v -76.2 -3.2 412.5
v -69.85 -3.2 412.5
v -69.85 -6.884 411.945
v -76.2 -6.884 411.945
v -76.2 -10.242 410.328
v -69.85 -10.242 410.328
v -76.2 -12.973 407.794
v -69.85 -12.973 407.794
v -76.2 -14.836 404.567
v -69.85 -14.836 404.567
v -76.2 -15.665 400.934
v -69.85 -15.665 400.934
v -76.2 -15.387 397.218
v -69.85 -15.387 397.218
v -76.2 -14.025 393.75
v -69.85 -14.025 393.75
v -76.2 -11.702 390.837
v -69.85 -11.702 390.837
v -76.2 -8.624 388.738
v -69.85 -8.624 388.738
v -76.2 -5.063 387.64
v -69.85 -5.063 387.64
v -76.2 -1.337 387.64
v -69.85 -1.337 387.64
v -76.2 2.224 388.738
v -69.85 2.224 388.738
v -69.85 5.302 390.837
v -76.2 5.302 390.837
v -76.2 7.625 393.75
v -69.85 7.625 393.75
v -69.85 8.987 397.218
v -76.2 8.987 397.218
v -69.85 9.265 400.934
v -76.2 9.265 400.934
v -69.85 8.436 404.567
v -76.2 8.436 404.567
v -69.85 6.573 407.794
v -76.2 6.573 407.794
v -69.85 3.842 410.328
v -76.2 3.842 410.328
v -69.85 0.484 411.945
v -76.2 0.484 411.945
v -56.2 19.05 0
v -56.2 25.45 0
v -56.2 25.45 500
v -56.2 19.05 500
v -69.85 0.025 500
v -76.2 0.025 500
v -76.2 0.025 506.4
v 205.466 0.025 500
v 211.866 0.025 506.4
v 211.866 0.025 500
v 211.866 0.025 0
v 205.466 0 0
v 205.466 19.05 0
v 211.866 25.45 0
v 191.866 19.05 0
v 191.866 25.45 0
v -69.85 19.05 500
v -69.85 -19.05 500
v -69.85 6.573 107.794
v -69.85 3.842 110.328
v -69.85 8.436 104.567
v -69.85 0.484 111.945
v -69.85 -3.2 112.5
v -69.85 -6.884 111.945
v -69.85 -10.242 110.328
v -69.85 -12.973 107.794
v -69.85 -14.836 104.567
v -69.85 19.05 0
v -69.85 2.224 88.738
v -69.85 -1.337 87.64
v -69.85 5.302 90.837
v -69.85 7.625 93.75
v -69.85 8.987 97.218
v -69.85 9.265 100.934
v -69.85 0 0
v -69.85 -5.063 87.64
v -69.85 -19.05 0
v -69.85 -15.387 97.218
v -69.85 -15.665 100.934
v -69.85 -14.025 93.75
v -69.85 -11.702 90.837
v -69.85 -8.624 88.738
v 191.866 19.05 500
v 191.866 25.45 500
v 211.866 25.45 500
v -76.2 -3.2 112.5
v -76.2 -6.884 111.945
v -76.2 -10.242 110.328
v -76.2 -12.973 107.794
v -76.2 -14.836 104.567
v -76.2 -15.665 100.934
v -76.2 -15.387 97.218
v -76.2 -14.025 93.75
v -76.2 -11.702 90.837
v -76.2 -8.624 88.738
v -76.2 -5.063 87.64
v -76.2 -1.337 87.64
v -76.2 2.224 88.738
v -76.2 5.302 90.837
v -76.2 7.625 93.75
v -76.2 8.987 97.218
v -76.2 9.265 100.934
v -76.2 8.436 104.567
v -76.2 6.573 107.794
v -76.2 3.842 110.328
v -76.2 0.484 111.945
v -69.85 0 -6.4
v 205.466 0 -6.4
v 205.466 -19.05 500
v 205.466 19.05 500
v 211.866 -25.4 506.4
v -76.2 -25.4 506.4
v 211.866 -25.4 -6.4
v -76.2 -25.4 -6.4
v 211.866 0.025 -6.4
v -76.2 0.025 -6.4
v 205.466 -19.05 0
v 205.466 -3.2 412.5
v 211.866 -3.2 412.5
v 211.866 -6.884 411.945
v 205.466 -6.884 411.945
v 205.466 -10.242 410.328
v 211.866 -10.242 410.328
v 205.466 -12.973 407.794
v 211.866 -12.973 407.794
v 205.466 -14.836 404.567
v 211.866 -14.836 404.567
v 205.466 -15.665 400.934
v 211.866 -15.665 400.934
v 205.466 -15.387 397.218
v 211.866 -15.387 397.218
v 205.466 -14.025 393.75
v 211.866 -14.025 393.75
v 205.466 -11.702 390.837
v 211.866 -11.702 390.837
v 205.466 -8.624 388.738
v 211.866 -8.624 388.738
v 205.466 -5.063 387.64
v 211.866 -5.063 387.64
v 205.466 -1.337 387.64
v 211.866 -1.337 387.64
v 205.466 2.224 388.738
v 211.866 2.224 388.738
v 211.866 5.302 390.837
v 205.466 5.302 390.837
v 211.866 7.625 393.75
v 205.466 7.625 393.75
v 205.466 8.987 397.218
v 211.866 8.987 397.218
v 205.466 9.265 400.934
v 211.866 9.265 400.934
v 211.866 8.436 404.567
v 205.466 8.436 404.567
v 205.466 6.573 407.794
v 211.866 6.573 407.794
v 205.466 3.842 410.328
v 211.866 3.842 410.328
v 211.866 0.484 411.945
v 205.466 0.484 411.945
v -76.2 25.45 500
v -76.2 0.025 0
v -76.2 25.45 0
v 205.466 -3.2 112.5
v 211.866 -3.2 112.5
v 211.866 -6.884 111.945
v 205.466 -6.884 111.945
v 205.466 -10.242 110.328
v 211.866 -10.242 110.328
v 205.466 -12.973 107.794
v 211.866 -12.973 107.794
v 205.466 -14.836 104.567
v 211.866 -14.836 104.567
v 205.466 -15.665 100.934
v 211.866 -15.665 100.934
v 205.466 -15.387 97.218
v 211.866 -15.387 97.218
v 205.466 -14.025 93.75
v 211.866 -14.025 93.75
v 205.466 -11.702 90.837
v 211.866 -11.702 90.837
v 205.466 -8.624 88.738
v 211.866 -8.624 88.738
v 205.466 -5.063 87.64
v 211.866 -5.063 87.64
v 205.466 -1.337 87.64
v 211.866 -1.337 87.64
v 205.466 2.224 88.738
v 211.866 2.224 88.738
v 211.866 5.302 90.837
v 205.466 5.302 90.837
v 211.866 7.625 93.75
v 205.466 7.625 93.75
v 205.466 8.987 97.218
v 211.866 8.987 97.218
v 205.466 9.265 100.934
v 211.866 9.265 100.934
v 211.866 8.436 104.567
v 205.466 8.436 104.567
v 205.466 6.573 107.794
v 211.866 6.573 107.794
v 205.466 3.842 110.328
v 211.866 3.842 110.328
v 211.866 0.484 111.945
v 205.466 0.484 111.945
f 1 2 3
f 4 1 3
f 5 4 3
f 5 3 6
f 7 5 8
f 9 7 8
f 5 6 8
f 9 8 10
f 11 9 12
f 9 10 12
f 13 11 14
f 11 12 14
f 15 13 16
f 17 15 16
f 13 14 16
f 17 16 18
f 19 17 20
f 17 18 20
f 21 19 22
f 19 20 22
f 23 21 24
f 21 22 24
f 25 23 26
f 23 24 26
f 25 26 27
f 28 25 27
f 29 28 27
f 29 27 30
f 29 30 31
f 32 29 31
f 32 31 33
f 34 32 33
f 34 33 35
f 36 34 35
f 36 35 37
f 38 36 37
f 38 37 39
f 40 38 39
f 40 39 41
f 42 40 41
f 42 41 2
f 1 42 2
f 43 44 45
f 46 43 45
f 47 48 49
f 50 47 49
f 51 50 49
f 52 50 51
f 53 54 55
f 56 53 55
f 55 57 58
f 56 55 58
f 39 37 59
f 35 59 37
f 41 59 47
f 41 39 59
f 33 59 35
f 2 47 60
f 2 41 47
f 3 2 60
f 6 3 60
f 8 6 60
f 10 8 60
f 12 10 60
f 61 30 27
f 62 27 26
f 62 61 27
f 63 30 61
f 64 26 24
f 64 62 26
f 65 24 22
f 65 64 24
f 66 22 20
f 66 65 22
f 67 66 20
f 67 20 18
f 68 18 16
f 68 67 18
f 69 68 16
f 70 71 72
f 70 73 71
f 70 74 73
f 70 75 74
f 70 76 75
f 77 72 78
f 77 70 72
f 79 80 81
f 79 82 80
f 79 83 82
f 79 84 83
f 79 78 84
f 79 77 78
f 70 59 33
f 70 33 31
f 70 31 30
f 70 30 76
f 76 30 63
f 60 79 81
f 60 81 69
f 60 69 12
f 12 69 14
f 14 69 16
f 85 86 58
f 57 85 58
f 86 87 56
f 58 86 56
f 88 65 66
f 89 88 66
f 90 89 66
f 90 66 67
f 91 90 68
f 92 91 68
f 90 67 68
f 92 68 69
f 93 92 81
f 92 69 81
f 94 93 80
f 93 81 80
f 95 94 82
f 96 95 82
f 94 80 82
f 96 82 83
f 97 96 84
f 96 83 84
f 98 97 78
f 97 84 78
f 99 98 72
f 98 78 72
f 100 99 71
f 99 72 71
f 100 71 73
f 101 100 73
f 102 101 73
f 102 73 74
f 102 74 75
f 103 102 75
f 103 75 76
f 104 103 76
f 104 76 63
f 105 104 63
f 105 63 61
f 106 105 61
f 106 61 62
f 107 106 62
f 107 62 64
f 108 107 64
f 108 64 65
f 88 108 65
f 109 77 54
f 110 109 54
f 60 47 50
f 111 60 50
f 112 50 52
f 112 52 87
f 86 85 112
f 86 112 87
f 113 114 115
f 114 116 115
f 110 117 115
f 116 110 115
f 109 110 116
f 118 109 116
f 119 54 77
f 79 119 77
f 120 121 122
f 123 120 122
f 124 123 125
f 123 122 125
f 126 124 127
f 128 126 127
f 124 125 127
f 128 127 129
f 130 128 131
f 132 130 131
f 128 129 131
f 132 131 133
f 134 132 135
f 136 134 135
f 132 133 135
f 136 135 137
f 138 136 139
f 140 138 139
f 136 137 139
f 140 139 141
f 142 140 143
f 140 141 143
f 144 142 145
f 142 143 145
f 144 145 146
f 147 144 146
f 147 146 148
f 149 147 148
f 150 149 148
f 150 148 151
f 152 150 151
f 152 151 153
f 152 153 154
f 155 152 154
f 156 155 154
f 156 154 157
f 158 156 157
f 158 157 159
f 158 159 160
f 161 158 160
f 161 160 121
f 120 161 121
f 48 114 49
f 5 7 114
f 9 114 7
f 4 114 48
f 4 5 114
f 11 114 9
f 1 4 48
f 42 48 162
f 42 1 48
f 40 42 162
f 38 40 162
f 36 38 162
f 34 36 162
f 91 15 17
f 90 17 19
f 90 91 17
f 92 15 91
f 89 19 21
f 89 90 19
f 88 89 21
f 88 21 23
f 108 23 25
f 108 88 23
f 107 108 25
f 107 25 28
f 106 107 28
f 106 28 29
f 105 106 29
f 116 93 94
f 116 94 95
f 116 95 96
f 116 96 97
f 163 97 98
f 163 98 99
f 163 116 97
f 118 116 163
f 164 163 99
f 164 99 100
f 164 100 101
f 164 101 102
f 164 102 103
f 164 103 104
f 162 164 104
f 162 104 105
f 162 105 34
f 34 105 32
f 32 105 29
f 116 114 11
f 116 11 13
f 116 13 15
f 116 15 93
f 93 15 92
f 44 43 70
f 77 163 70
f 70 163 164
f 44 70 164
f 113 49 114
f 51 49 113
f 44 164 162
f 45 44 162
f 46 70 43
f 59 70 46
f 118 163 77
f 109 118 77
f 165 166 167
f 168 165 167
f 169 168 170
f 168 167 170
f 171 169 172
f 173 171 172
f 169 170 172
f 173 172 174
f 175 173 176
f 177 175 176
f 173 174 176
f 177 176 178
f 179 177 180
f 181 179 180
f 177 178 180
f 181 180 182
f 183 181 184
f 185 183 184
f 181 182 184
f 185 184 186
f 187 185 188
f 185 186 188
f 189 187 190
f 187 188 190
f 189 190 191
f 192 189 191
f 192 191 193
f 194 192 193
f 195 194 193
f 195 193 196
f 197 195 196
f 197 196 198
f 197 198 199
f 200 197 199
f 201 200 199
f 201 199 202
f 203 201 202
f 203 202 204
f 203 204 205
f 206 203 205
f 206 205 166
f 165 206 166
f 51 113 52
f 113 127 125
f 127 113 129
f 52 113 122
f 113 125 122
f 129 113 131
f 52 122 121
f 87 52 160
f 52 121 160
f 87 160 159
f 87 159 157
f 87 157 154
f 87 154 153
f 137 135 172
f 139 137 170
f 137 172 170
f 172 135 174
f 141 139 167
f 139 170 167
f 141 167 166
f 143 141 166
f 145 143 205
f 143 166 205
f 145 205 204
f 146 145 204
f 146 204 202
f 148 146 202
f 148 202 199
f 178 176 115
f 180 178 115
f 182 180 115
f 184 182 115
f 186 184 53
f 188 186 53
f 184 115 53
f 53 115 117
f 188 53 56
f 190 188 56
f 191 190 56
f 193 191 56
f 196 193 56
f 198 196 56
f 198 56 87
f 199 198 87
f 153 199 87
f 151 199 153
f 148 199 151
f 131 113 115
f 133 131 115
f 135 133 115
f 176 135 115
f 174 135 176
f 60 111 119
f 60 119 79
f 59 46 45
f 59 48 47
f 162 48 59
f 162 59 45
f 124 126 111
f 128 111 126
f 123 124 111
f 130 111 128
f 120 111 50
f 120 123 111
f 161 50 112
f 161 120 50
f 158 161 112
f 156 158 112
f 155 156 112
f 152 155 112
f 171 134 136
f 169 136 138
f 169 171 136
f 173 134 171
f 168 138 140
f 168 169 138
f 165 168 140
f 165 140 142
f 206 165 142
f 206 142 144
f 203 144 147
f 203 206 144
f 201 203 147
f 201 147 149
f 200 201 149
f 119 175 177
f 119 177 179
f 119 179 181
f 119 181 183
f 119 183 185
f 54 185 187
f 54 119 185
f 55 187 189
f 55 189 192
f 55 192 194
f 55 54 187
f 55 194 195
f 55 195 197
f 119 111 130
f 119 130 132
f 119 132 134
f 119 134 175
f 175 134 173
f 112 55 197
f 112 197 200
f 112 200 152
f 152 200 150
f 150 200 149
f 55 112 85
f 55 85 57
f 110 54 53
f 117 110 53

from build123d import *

# Parameters (mm, degrees)
BOSS_EXTRUDE1_DEPTH = 500
SKETCH2_R           = 12.5
CUT_EXTRUDE1_DEPTH  = 485.648
SKETCH3_W           = 500
SKETCH3_H           = 6.4
BOSS_EXTRUDE3_DEPTH = 20
SKETCH4_W           = 500
SKETCH4_H           = 6.4
BOSS_EXTRUDE4_DEPTH = 20
BOSS_EXTRUDE5_DEPTH = 6.4
SKETCH6_W           = 288.065528703
SKETCH6_H           = 25.425
BOSS_EXTRUDE6_DEPTH = 6.4


with BuildPart() as part:
    # Sketch1 → Boss-Extrude1 (new body)
    with BuildSketch(Plane.XY):
        Polygon((-69.85, 19.05), (-69.85, -19.049737181), (69.85, -19.049737181), (205.465528703, -19.049737181), (205.465528703, 19.05), (211.865528703, 19.05), (211.865528703, -25.4), (76.2, -25.4), (-76.2, -25.4), (-76.2, 19.05), align=None)
    extrude(amount=BOSS_EXTRUDE1_DEPTH)

    # Sketch2 → Cut-Extrude1 (cut)
    with BuildSketch(Plane(origin=(211.865528703, 0, 0), x_dir=(0, 0, -1), z_dir=(1, 0, 0))):
        with Locations(Location((-400, -3.2, 0), (0, 0, 180))):
            Circle(SKETCH2_R)
        with Locations(Location((-100, -3.2, 0), (0, 0, 180))):
            Circle(SKETCH2_R)
    extrude(amount=-CUT_EXTRUDE1_DEPTH, mode=Mode.SUBTRACT)

    # Sketch3 → Boss-Extrude3 (add)
    with BuildSketch(Plane(origin=(211.865528703, 0, 0), x_dir=(0, 0, -1), z_dir=(1, 0, 0))):
        with Locations((-250, 22.25)):
            Rectangle(SKETCH3_W, SKETCH3_H)
    extrude(amount=-BOSS_EXTRUDE3_DEPTH)

    # Sketch4 → Boss-Extrude4 (add)
    with BuildSketch(Plane.ZY.offset(76.2)):
        with Locations((250, 22.25)):
            Rectangle(SKETCH4_W, SKETCH4_H)
    extrude(amount=-BOSS_EXTRUDE4_DEPTH)

    # Sketch5 → Boss-Extrude5 (add)
    with BuildSketch(Plane(origin=(0, 0, 0), x_dir=(-1, 0, 0), z_dir=(0, 0, -1))):
        Polygon((-211.865528703, -25.4), (76.2, -25.4), (76.2, -19.058688743), (76.2, 0.025), (69.85, 0.00013141), (-205.465528703, 0.00013141), (-211.865528703, 0.025), (-211.865528703, -19.058688743), align=None)
    extrude(amount=BOSS_EXTRUDE5_DEPTH)

    # Sketch6 → Boss-Extrude6 (add)
    with BuildSketch(Plane.XY.offset(500)):
        with Locations((67.832764352, -12.6875)):
            Rectangle(SKETCH6_W, SKETCH6_H)
    extrude(amount=BOSS_EXTRUDE6_DEPTH)


solid = part.part
